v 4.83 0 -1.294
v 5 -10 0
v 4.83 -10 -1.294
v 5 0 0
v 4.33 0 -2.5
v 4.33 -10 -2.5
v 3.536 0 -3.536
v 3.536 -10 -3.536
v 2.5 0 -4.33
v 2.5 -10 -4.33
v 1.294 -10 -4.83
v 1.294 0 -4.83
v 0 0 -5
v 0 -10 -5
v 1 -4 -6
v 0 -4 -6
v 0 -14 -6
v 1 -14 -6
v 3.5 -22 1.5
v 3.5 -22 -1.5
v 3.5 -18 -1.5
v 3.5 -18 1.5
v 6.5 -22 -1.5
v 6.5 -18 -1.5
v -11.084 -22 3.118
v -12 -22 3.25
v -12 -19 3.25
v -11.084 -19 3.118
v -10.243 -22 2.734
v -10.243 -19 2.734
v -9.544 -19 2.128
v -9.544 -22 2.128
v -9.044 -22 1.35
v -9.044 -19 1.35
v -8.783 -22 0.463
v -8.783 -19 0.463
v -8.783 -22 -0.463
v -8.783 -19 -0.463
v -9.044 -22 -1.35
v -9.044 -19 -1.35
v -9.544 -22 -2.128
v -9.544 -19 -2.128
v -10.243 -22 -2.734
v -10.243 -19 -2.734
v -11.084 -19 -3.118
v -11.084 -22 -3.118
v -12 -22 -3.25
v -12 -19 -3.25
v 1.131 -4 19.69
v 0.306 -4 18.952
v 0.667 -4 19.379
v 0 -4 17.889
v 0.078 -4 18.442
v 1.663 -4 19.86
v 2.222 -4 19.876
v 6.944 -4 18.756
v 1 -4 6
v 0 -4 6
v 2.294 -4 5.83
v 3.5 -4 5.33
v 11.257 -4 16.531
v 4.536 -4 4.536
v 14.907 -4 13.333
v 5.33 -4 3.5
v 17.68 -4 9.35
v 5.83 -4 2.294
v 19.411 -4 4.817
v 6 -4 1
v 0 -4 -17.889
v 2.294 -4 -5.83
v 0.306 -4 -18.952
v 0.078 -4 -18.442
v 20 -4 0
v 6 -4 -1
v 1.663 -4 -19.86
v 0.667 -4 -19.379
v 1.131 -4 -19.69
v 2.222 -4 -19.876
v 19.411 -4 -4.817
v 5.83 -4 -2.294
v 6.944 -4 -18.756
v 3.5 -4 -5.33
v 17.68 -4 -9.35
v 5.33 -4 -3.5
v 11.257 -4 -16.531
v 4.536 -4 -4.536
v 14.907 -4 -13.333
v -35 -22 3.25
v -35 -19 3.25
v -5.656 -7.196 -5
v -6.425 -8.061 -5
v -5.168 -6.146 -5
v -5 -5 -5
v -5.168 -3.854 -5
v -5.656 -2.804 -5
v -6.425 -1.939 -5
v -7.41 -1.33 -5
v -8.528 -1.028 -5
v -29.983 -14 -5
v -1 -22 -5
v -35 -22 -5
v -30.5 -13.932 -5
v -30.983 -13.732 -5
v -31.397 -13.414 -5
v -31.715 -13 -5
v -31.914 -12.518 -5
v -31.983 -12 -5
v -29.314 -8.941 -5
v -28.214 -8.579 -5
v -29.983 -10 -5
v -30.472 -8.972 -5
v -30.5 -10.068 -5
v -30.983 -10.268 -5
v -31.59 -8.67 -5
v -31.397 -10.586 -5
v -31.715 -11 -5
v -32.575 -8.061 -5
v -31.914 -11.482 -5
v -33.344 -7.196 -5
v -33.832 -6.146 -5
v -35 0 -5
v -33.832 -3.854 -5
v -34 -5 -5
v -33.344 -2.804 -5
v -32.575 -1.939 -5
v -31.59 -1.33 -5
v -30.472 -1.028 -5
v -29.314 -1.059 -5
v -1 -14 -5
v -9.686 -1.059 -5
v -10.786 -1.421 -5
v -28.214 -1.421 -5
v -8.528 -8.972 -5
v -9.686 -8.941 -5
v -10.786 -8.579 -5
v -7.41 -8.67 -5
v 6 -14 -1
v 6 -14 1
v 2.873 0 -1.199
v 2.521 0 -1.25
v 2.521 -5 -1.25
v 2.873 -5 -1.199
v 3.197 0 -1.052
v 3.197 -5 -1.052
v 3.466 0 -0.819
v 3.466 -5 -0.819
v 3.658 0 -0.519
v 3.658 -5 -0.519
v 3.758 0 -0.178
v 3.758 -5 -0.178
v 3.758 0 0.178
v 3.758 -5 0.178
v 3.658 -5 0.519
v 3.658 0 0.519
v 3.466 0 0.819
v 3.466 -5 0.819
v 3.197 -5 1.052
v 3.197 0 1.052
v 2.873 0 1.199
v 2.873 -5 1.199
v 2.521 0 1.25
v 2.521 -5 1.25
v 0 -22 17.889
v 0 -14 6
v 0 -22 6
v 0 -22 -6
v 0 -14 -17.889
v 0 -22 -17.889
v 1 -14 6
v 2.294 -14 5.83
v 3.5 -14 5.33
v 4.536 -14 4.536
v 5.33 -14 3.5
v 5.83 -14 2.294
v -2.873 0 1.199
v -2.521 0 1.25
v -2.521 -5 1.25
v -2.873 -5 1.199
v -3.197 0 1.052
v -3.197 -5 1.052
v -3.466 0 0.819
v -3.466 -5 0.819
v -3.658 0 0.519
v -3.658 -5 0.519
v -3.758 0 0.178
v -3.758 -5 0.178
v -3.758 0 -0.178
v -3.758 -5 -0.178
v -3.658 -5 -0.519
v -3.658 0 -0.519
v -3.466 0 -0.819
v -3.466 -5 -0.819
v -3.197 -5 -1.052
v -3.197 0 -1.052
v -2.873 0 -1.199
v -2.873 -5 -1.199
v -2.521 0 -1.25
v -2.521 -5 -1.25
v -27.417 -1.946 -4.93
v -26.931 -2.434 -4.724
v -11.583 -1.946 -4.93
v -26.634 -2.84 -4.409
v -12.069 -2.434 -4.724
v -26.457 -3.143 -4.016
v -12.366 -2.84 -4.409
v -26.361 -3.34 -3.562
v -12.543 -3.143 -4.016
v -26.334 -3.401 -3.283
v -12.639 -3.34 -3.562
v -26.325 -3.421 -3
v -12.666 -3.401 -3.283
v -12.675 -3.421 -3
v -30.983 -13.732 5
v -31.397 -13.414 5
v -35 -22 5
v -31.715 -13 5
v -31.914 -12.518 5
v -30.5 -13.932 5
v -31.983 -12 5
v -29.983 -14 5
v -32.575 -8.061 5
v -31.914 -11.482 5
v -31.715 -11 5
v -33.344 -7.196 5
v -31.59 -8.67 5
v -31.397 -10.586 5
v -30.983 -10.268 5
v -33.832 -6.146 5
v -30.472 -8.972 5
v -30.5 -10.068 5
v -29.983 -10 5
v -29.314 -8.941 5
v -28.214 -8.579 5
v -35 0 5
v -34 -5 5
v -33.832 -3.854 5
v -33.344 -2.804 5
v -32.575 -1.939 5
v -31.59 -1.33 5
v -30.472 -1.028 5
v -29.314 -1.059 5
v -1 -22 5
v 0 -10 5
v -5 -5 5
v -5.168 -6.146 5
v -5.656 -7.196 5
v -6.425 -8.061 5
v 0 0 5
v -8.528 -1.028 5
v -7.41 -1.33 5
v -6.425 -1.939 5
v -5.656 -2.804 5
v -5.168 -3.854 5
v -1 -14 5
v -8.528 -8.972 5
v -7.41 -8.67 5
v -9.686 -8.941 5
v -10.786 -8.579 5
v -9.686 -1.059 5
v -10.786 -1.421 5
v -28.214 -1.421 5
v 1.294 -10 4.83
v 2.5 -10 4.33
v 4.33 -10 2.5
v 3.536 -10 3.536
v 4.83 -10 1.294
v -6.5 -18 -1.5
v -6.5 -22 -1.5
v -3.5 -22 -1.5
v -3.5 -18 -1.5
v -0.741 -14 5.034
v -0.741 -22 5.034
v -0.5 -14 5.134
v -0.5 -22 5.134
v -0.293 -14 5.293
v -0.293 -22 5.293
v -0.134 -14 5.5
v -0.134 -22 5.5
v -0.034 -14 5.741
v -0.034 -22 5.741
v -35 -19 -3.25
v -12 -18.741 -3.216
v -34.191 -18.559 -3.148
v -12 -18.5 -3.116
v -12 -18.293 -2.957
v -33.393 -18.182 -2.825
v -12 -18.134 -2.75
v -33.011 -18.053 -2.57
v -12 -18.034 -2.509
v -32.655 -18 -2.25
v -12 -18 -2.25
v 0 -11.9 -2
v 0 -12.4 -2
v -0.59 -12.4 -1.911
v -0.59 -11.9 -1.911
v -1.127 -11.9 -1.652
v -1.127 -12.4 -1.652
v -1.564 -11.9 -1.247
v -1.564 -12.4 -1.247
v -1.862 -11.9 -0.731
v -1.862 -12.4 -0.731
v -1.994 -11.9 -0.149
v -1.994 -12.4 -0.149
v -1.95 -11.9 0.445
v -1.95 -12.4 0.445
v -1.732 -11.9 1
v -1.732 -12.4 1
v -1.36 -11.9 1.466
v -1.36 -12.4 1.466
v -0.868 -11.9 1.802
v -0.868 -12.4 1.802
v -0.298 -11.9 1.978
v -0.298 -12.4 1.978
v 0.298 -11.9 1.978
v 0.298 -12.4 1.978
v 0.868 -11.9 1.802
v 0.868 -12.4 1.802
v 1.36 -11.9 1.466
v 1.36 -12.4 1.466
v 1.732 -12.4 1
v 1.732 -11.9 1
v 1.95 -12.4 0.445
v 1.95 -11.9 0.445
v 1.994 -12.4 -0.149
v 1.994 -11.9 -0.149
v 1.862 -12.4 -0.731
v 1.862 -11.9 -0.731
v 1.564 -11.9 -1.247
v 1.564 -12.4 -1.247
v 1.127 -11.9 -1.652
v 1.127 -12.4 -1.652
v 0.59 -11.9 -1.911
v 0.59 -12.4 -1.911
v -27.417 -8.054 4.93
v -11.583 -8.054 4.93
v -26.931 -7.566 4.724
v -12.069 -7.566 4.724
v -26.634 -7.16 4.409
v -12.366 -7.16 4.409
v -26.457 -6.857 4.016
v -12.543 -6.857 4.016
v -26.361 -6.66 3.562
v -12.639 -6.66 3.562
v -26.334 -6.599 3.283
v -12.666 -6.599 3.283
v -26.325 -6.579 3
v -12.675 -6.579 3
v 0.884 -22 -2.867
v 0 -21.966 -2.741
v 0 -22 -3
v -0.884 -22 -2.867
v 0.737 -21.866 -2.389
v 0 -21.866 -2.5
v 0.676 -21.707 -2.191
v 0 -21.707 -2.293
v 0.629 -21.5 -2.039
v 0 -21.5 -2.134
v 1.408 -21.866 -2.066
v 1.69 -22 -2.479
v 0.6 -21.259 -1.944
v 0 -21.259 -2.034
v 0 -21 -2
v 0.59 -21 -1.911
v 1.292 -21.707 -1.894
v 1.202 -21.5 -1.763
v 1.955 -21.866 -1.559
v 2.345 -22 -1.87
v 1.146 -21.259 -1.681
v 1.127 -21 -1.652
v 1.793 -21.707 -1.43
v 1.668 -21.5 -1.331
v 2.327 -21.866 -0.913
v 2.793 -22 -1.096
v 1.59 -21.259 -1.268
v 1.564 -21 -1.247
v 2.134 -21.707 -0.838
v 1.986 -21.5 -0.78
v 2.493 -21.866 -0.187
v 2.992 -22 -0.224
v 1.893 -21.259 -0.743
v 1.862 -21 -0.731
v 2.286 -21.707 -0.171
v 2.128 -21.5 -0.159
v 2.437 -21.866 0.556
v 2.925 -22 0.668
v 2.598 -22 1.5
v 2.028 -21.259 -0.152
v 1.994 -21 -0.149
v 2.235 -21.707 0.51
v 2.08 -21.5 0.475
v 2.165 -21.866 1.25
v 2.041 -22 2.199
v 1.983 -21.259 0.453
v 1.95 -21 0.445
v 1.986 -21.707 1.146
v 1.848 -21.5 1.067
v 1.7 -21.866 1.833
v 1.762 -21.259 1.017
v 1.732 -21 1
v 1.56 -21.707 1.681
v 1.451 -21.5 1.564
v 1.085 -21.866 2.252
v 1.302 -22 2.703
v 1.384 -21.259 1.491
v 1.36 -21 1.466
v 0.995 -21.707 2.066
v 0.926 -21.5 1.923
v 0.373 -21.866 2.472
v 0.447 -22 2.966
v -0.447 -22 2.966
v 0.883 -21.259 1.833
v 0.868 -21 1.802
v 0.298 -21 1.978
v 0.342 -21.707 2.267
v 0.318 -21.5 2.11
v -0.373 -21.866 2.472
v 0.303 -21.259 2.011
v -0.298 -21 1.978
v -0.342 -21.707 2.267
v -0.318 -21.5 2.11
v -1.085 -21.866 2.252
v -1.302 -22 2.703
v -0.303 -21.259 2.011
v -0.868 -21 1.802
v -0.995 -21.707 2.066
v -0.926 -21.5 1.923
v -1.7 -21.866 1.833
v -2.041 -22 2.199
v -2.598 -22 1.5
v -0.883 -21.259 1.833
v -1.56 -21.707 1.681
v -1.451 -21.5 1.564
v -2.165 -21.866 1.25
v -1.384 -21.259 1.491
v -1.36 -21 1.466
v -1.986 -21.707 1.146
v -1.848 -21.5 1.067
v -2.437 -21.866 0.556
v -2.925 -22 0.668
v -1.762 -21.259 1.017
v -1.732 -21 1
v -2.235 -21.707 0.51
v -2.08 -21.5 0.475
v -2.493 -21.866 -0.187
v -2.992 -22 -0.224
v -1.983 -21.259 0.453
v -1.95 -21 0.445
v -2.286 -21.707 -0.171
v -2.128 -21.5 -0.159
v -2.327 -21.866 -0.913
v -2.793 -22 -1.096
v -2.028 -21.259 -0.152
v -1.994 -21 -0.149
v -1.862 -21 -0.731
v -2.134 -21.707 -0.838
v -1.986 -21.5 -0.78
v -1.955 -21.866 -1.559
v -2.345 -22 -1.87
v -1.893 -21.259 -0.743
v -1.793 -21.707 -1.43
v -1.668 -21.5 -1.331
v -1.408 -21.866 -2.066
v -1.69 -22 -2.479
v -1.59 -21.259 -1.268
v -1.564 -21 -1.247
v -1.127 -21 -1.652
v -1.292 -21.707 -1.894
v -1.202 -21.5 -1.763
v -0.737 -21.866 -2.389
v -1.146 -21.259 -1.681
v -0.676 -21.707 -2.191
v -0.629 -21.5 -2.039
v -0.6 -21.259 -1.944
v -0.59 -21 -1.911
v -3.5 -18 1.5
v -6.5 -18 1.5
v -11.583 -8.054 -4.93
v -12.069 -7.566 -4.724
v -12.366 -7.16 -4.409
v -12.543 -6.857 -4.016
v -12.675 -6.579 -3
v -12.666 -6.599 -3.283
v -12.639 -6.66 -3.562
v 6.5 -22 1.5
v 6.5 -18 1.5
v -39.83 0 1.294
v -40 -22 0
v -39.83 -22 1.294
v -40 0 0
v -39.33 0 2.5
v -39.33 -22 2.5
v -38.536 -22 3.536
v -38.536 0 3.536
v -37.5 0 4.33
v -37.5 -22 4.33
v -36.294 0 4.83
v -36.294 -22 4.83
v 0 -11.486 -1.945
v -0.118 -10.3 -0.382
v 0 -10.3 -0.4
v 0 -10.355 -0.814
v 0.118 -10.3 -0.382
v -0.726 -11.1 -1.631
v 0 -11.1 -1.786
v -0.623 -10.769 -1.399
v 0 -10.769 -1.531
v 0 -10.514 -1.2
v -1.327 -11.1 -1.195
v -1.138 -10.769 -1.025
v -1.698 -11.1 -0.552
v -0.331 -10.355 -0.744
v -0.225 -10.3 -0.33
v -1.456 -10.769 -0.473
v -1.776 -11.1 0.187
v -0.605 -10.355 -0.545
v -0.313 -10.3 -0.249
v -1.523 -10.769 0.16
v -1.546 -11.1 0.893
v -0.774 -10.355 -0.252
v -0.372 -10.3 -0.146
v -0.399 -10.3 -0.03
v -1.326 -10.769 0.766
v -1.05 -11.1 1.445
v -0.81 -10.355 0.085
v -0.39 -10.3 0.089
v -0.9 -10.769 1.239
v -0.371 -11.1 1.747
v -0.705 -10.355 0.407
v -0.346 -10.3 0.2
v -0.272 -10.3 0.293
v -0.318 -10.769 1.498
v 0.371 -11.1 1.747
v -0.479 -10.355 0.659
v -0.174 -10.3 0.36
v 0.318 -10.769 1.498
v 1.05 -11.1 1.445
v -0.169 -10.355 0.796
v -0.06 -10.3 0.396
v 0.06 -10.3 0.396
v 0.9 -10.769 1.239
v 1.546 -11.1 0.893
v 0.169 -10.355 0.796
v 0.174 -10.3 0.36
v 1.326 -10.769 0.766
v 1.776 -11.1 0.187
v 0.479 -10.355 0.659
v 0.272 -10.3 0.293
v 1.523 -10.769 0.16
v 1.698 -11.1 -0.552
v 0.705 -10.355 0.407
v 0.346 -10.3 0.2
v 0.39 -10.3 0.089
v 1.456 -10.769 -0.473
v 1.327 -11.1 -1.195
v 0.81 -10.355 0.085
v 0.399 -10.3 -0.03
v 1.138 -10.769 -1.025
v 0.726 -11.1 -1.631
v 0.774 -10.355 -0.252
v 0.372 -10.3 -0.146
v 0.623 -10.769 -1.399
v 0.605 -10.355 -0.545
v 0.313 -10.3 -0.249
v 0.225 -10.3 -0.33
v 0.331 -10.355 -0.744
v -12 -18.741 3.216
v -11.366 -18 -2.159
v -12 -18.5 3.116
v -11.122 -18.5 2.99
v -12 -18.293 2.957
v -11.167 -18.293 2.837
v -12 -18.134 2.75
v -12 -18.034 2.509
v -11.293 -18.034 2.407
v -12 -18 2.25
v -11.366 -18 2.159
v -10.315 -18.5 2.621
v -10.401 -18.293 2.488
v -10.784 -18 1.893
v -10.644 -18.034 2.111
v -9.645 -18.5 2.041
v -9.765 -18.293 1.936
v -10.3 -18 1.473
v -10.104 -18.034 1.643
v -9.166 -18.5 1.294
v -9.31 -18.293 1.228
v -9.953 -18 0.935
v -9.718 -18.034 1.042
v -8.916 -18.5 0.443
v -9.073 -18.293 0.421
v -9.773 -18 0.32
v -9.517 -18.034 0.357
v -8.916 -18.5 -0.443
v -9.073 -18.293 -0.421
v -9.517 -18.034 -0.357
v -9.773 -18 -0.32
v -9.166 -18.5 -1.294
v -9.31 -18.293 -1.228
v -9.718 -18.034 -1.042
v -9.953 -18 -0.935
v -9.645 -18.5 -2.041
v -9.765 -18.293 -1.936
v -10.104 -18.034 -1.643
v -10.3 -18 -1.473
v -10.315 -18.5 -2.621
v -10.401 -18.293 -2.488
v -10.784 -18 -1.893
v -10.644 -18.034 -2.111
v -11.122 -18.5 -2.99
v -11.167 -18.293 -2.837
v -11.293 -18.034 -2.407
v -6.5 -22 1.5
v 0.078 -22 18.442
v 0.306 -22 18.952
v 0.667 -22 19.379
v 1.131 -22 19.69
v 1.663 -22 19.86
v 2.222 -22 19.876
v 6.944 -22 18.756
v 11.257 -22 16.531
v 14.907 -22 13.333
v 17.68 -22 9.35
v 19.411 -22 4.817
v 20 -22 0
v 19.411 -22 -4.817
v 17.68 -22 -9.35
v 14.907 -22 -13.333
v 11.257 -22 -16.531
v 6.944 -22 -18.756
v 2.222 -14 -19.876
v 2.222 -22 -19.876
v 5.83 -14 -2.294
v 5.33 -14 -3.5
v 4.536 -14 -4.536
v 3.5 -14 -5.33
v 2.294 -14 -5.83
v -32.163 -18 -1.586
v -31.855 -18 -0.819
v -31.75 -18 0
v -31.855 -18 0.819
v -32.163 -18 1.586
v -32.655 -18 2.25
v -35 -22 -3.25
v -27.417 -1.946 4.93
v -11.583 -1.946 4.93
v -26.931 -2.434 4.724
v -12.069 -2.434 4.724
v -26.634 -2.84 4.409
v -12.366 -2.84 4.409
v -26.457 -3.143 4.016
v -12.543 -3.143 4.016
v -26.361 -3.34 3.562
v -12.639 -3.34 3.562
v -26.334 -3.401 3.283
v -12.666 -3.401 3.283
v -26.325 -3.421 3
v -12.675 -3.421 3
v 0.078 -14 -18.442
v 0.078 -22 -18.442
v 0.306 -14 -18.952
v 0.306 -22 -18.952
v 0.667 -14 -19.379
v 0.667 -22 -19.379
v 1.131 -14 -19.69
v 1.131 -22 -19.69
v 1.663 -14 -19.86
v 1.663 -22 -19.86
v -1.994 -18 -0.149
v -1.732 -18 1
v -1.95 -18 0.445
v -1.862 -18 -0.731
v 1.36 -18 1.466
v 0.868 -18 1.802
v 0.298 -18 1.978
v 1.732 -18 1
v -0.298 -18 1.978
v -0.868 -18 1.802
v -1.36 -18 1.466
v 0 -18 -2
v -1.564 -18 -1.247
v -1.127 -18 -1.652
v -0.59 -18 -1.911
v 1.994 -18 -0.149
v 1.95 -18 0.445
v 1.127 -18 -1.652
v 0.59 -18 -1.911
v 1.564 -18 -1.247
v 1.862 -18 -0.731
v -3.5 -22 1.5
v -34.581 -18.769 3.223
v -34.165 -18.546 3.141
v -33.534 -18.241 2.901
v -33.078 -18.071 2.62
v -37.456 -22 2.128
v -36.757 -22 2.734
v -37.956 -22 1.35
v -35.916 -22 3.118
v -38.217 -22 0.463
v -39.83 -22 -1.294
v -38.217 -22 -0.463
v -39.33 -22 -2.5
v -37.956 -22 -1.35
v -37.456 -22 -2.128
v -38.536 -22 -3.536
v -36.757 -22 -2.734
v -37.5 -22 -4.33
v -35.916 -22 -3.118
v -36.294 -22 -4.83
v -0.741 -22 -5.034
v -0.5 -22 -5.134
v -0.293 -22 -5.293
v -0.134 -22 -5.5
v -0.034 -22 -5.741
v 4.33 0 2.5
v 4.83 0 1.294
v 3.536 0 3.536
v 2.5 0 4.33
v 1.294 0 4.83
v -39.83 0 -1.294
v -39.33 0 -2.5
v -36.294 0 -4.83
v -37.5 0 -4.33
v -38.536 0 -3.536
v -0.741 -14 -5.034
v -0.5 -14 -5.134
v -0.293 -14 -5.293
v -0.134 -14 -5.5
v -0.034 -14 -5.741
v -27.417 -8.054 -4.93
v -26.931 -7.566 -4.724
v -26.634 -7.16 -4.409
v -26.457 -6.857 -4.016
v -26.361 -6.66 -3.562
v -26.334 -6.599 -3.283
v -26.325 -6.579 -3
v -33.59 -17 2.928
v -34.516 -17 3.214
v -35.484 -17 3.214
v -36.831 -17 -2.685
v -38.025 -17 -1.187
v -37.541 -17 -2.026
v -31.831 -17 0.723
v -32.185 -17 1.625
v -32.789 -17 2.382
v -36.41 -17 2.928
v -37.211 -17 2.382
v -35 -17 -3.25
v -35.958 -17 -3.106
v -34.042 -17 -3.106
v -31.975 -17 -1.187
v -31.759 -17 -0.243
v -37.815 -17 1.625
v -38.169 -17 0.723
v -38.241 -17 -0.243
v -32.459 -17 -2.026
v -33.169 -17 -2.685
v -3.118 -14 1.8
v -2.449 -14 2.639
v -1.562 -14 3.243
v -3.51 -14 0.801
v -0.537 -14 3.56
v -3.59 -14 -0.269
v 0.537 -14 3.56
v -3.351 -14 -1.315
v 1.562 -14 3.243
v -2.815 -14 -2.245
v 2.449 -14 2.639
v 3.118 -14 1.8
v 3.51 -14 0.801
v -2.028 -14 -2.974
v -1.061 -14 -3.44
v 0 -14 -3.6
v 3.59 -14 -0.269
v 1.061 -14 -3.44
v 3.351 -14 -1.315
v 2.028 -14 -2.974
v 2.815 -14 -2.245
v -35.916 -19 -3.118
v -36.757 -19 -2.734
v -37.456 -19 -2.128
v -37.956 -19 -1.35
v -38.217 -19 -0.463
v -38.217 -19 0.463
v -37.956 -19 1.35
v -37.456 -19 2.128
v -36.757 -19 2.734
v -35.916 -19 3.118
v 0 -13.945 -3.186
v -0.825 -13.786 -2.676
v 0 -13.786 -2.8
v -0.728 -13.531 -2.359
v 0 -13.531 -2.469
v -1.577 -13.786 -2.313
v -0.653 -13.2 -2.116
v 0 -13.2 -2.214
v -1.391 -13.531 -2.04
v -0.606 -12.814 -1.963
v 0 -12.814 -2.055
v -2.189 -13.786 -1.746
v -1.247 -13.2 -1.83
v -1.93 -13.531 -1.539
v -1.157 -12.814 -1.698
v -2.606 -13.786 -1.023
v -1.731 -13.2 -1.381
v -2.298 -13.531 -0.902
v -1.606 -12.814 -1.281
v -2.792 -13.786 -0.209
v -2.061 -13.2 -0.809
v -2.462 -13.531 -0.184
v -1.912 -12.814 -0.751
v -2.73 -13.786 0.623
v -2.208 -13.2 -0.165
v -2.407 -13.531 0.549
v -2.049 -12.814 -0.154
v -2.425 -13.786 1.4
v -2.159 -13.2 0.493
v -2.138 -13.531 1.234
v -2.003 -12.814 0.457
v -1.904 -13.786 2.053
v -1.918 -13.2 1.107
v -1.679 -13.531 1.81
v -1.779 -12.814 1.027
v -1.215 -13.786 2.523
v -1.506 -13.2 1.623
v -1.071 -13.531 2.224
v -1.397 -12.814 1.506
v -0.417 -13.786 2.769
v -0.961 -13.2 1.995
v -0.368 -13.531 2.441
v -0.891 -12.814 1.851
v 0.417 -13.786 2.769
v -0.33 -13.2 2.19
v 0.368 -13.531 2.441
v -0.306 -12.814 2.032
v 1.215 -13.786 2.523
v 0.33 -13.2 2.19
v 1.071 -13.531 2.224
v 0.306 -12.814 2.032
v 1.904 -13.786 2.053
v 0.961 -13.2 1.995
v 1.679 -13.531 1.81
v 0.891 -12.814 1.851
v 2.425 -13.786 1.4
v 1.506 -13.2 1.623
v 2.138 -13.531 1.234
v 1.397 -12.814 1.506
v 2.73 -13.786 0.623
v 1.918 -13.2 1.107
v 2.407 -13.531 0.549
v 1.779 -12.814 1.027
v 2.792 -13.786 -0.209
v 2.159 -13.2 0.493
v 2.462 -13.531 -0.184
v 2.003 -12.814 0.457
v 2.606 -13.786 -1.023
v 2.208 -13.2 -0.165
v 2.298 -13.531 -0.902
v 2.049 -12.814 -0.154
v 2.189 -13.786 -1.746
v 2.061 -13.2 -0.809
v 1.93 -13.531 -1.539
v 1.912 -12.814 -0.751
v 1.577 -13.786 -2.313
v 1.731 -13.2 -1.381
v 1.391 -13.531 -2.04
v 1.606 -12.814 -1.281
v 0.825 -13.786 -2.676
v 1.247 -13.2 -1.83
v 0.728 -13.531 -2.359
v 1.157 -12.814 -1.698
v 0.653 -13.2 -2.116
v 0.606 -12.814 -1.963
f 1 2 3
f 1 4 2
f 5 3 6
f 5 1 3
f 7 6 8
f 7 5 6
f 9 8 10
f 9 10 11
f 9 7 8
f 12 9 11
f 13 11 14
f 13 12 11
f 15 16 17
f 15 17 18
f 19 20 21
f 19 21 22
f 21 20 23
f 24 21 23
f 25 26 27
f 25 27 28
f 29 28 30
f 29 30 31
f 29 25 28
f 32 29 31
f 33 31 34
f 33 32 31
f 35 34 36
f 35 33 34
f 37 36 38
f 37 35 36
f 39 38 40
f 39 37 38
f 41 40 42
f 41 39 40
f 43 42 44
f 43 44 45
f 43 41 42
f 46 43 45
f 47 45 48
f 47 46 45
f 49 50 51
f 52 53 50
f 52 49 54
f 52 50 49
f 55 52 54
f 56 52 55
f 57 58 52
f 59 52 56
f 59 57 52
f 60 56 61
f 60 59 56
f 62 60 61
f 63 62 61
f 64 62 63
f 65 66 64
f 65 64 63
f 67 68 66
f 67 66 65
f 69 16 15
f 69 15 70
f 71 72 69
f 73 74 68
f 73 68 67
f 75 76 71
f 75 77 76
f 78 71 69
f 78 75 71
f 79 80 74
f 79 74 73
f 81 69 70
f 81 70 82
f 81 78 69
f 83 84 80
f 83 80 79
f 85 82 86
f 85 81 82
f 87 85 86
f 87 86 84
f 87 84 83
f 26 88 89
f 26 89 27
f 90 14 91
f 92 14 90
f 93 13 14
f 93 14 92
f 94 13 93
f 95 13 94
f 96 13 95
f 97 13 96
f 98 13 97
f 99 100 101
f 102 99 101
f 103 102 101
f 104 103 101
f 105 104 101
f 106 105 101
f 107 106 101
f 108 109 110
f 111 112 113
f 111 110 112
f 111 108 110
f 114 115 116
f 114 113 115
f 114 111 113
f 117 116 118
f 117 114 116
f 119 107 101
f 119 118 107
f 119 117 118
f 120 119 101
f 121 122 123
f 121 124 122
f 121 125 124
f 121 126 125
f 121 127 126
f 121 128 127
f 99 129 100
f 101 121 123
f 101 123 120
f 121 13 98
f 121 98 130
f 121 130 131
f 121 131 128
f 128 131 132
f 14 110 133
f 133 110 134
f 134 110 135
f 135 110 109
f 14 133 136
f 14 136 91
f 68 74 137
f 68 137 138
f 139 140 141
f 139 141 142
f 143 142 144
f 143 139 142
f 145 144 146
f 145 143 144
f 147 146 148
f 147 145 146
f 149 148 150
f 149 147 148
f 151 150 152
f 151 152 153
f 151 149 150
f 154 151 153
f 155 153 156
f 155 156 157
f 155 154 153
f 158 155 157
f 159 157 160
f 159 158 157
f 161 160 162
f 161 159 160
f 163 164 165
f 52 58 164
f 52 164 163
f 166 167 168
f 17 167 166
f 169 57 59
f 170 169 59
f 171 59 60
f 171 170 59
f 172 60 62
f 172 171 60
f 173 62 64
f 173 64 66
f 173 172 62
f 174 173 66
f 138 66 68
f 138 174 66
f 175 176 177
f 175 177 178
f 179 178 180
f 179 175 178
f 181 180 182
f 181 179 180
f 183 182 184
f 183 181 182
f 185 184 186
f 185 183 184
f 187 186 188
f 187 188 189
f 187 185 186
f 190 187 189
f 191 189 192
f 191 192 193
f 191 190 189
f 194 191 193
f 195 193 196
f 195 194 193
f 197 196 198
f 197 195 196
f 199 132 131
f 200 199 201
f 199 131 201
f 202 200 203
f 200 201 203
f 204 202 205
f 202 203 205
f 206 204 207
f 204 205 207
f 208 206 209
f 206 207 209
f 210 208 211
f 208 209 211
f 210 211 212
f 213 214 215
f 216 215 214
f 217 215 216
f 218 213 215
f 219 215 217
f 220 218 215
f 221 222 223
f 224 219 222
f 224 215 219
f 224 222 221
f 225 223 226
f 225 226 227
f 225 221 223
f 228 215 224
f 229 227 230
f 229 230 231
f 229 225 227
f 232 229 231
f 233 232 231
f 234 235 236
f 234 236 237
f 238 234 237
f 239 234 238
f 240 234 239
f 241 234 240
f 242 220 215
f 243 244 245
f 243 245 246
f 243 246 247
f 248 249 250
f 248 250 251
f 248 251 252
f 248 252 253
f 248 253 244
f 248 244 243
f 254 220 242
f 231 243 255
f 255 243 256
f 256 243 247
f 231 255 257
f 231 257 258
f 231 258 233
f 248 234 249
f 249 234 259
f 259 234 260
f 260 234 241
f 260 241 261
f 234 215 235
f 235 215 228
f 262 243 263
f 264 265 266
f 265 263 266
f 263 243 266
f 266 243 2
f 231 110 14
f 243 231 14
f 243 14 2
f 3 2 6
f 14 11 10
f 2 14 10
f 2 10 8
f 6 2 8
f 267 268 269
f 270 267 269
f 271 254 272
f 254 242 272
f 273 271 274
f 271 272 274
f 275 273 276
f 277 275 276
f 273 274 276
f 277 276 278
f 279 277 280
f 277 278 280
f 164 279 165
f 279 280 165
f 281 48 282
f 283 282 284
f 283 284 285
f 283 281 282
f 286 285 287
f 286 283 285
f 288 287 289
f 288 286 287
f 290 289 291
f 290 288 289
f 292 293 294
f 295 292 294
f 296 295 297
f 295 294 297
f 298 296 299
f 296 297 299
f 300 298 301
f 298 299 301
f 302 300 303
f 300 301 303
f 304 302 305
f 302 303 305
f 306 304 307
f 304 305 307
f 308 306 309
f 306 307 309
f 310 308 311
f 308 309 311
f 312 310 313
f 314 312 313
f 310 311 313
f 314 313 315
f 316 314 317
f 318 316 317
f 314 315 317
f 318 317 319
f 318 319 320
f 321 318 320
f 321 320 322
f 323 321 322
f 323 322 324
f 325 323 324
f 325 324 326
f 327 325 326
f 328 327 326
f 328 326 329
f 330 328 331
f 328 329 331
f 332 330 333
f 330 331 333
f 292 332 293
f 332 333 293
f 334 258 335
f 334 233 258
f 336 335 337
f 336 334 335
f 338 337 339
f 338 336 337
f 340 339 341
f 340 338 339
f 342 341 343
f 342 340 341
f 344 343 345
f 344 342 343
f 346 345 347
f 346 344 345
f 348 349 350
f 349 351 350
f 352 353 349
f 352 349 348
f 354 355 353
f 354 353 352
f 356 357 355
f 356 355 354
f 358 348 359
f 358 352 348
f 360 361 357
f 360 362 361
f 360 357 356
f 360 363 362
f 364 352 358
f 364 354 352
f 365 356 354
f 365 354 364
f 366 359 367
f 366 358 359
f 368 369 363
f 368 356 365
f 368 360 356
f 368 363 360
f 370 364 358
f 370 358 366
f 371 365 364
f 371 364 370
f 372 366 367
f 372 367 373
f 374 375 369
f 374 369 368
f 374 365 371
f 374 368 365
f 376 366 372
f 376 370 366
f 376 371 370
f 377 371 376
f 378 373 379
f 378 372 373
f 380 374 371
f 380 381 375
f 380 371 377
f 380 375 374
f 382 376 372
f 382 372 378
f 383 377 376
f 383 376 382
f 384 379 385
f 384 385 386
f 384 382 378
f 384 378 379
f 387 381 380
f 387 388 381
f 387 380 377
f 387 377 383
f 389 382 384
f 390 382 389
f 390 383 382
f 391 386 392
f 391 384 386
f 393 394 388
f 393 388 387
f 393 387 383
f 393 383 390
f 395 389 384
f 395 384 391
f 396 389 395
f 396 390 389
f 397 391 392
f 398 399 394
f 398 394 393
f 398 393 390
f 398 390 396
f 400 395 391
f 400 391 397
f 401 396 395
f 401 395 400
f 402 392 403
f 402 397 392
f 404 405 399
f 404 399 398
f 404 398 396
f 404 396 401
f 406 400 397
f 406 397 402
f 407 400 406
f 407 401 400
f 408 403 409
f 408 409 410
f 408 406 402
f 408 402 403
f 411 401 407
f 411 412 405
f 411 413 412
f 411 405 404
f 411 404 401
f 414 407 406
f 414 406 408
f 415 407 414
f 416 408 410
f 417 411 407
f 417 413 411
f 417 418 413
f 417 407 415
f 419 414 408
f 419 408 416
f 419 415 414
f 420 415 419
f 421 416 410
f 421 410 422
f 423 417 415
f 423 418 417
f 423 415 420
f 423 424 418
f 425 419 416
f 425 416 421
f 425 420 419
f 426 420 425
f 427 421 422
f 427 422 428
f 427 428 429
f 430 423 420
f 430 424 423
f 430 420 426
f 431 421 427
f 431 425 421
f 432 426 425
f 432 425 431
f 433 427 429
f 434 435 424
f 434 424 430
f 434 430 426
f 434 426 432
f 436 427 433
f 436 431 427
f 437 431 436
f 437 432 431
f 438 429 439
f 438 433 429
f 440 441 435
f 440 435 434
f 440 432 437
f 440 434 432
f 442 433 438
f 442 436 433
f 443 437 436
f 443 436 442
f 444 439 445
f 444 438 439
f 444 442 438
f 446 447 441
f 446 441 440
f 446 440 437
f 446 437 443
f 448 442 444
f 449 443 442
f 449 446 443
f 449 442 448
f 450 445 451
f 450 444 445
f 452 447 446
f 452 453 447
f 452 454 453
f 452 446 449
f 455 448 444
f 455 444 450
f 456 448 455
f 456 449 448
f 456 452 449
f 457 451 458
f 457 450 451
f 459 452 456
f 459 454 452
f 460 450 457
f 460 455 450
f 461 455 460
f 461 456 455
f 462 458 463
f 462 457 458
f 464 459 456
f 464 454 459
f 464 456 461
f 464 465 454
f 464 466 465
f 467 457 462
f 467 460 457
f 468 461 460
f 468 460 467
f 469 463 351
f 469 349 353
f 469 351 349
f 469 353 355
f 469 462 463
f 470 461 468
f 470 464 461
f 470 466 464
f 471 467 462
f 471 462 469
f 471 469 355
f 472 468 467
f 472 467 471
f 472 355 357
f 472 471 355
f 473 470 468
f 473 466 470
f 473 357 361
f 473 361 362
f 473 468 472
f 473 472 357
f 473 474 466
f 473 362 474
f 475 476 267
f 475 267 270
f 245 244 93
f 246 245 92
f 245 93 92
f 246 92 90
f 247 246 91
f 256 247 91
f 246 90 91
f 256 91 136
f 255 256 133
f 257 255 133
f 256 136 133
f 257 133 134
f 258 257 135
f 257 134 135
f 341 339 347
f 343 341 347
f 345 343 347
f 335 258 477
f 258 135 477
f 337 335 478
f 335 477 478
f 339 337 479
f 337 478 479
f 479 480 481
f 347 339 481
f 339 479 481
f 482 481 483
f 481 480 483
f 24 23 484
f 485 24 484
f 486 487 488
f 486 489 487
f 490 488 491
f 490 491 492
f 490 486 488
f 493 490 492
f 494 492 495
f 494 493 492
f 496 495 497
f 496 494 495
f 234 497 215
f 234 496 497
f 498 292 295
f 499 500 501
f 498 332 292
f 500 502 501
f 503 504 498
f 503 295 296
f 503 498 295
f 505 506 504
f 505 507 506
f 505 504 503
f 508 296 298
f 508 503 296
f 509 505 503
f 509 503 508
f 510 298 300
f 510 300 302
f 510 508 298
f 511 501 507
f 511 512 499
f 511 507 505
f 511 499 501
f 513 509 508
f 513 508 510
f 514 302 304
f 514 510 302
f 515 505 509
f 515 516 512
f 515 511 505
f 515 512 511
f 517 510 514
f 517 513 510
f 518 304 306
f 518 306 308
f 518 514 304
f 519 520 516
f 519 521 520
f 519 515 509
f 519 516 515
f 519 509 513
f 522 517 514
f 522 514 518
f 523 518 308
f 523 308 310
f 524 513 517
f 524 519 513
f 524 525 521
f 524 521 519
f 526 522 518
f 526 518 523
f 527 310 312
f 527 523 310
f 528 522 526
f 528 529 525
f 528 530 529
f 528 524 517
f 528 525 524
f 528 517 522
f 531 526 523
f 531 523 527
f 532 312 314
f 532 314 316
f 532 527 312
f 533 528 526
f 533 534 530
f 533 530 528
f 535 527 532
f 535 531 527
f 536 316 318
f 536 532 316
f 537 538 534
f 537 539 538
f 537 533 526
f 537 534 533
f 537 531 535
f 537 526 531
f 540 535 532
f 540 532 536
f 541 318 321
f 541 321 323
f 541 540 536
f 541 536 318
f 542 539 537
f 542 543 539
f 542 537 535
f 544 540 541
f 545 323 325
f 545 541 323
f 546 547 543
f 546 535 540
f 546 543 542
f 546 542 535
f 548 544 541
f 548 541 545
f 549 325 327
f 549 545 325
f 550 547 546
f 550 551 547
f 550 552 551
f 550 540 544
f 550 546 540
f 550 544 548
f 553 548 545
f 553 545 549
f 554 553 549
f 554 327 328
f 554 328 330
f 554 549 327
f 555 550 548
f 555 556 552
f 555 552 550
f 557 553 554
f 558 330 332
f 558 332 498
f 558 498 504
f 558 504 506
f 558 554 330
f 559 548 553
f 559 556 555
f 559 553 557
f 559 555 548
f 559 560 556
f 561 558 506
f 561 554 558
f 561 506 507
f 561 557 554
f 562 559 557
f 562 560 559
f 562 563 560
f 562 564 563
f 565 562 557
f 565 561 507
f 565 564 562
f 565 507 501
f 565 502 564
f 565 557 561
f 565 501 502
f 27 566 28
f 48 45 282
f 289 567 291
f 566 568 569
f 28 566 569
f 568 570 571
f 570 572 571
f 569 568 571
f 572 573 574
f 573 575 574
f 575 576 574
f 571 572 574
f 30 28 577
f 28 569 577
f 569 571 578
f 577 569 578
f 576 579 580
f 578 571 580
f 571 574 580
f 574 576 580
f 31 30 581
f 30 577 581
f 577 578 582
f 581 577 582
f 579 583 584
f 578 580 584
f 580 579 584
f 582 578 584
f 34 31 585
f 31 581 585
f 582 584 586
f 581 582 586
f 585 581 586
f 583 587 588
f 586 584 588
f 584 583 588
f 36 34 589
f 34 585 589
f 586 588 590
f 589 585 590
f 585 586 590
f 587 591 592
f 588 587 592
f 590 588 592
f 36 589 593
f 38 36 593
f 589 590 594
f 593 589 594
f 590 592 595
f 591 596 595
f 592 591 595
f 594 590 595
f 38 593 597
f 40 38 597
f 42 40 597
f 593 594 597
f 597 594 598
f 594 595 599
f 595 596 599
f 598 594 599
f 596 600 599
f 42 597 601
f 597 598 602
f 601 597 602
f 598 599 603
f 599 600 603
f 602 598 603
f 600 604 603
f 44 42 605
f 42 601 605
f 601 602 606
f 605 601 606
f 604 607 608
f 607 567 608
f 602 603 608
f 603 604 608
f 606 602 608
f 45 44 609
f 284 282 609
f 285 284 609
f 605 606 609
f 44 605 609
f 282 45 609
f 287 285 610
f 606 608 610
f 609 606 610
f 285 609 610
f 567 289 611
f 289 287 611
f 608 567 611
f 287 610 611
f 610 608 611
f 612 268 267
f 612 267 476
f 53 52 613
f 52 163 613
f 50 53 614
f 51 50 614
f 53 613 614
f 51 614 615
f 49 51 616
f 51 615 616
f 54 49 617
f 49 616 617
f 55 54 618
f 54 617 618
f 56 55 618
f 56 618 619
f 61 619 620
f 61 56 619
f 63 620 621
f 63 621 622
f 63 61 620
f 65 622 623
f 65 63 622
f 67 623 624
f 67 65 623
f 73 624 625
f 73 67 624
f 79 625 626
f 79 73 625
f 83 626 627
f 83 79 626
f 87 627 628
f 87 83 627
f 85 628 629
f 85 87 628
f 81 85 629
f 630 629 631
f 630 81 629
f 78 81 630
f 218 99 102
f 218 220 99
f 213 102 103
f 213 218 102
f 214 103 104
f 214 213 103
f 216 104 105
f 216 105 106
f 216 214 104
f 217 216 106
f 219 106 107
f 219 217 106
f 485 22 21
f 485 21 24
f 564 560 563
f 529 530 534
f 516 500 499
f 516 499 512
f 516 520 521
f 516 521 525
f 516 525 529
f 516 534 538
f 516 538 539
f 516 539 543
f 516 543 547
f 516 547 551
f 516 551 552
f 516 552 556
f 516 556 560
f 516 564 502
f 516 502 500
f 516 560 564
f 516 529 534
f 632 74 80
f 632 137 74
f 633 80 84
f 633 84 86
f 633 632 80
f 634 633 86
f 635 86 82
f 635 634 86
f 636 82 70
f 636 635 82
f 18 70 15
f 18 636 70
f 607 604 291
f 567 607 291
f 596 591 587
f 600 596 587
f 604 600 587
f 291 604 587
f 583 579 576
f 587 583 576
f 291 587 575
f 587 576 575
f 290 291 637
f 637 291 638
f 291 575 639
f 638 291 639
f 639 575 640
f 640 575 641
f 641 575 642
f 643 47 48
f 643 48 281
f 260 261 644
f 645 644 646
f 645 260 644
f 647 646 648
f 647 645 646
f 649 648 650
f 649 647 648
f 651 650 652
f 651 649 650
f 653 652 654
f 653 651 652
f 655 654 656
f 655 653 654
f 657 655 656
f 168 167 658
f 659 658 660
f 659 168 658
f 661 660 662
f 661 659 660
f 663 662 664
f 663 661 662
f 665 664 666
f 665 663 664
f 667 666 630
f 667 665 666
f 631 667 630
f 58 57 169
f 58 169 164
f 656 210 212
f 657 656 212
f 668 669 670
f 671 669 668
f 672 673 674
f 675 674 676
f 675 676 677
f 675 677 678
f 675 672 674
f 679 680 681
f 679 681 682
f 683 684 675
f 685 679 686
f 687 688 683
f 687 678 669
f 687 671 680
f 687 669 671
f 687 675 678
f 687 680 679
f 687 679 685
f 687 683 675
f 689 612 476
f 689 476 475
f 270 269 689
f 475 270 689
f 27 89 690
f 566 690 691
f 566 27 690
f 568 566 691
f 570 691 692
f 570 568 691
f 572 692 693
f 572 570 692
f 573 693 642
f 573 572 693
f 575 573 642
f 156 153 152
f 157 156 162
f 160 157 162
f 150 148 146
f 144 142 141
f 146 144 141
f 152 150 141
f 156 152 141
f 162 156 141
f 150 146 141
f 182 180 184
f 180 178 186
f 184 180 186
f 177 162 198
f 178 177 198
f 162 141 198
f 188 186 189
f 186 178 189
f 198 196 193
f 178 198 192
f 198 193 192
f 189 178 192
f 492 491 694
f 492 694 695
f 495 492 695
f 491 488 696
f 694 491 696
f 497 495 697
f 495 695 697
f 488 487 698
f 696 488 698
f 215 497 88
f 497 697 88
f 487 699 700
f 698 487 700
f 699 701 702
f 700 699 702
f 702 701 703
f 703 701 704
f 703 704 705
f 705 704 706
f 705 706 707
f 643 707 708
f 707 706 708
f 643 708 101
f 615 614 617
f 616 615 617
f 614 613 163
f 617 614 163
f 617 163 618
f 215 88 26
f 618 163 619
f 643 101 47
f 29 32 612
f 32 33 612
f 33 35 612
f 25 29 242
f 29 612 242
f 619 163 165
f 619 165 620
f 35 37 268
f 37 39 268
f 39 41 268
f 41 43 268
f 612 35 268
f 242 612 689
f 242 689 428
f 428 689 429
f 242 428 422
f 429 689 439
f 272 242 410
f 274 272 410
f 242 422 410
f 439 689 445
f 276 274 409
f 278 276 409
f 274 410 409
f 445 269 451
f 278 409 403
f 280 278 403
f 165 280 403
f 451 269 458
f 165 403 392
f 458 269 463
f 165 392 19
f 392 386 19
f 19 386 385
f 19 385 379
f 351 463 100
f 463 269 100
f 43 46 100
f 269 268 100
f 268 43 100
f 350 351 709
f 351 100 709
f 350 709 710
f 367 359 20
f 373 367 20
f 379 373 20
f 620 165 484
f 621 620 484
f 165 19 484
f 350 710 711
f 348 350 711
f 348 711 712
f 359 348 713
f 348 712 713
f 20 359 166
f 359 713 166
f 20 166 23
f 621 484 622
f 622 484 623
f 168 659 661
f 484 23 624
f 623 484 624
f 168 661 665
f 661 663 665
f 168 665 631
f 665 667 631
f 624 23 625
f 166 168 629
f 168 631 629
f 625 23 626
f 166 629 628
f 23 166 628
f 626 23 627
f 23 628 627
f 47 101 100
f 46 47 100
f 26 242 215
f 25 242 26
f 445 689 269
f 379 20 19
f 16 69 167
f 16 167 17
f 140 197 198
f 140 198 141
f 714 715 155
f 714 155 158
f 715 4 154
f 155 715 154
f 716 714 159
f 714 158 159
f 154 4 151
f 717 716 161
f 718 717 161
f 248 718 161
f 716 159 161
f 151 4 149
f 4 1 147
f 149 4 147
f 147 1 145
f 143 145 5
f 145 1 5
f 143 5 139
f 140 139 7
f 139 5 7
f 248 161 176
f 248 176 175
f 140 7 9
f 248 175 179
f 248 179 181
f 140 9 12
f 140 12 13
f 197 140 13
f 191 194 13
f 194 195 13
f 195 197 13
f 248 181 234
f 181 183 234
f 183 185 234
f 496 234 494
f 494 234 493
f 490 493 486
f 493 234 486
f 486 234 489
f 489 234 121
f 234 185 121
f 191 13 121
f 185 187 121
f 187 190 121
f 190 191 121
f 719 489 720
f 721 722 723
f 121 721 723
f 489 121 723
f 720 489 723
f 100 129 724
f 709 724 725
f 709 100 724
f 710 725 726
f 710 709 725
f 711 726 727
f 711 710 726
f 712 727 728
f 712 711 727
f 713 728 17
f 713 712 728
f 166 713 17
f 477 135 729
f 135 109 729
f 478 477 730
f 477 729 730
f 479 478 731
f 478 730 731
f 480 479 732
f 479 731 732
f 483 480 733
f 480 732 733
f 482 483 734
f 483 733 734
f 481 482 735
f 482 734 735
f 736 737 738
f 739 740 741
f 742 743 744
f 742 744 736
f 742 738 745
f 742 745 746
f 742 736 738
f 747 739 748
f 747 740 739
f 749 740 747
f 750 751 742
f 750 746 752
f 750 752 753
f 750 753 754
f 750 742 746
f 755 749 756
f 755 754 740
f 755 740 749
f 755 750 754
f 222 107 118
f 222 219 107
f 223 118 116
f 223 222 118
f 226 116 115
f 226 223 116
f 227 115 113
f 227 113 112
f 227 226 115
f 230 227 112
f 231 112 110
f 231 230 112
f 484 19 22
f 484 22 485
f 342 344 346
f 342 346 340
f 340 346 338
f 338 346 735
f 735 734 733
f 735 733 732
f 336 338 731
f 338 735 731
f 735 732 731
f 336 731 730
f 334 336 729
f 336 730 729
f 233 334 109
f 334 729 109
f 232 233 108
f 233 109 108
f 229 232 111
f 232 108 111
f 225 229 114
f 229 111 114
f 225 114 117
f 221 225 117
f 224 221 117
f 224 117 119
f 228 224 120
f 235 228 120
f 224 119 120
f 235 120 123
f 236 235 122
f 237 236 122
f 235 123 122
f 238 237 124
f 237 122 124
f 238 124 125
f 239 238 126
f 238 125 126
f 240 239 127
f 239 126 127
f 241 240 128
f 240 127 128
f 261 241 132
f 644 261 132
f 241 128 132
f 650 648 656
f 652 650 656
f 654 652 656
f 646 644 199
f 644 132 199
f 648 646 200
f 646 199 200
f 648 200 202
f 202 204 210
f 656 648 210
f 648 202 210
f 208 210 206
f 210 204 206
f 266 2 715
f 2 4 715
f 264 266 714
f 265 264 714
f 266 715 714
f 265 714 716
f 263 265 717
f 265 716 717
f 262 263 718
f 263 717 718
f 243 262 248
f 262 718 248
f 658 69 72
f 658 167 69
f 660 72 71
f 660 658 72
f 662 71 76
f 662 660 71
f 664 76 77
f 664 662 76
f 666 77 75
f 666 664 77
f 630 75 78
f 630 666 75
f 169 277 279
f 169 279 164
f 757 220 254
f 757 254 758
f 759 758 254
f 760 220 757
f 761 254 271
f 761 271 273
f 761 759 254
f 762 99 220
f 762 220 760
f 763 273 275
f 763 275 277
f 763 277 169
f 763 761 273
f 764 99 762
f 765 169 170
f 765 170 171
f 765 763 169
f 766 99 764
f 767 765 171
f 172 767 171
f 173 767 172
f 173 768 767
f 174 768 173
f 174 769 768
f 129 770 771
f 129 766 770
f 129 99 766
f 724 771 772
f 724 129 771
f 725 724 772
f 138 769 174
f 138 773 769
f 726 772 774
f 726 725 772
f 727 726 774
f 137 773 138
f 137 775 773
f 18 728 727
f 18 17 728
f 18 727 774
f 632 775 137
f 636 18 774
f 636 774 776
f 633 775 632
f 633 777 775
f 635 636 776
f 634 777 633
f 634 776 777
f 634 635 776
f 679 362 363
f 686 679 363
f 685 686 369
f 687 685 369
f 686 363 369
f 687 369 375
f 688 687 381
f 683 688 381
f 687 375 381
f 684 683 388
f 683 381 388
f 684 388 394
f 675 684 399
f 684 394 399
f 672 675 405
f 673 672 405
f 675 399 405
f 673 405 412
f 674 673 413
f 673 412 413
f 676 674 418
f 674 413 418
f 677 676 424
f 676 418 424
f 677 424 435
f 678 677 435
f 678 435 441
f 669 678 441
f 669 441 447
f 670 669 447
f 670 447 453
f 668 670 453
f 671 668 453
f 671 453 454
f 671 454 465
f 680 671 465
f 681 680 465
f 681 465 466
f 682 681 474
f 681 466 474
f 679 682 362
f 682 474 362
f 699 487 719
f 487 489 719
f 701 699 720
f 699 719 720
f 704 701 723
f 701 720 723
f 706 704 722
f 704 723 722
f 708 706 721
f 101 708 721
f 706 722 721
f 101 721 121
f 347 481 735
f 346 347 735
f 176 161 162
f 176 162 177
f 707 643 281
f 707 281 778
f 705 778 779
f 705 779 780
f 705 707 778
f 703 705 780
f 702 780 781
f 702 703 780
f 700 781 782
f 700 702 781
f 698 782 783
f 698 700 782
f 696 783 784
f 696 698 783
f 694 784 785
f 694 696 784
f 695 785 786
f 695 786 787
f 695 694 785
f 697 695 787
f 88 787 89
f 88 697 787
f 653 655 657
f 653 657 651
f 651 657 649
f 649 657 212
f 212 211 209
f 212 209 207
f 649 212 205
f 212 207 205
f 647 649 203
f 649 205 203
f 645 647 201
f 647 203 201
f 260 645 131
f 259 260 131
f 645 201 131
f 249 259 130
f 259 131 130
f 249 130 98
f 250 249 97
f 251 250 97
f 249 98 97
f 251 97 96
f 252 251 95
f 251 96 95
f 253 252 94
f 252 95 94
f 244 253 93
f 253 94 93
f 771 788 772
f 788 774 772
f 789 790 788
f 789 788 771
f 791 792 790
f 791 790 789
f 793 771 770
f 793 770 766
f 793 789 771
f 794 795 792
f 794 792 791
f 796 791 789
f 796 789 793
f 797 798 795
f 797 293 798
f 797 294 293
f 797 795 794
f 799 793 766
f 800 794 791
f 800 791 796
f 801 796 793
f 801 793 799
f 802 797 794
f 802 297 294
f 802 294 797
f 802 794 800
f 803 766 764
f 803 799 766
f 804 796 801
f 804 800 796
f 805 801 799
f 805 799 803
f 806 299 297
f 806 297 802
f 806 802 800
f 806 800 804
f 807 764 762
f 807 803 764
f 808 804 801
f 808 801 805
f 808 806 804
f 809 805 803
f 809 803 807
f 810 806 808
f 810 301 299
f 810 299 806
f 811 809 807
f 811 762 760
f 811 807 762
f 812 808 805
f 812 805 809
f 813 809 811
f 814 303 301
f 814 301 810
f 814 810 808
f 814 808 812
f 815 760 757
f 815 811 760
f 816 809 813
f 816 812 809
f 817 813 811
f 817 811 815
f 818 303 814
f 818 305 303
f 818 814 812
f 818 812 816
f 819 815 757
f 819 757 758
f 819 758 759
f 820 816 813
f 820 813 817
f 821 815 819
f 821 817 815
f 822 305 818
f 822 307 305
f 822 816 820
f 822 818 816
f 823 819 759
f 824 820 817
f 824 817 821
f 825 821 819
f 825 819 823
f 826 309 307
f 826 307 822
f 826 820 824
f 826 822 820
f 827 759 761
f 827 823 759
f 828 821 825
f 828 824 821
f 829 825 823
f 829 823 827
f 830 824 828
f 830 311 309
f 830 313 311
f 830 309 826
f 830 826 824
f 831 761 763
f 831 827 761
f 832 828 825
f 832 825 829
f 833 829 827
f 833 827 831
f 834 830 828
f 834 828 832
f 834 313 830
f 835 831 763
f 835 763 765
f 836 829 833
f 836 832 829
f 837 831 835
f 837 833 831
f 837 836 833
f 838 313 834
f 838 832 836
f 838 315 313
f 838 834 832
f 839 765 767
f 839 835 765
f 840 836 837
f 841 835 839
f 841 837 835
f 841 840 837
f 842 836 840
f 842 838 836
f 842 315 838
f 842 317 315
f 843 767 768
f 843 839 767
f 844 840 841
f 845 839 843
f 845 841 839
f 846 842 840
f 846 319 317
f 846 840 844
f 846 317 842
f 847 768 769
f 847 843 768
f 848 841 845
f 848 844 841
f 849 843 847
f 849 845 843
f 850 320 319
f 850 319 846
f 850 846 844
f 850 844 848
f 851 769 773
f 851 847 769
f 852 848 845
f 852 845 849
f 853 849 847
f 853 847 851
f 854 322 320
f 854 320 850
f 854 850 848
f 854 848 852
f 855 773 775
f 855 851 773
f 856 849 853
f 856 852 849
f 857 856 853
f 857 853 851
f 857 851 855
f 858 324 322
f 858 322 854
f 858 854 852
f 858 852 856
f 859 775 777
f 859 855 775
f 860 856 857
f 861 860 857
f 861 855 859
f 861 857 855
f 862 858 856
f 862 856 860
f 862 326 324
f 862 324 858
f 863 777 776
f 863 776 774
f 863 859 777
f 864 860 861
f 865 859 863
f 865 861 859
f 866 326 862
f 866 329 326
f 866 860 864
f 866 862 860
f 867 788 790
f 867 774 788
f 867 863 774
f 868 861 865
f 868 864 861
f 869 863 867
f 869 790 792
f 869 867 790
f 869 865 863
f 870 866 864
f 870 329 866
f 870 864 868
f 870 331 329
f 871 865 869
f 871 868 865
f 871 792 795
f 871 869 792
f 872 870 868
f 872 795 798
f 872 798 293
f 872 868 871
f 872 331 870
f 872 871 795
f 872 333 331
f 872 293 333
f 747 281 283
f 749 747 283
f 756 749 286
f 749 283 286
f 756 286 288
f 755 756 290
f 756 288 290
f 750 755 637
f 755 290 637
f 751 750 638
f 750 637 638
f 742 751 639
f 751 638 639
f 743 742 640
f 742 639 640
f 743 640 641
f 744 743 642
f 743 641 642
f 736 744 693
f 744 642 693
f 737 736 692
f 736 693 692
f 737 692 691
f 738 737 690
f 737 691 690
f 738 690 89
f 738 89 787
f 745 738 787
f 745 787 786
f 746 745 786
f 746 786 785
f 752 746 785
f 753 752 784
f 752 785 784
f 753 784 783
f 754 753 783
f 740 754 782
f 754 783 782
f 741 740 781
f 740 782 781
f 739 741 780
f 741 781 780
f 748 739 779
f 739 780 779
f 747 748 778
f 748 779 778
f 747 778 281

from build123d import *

# Parameters (mm, degrees)
BOSS_EXTRUDE1_DEPTH      = 5
BOSS_EXTRUDE1_DEPTH_BACK = 5
CUT_EXTRUDE1_DEPTH       = 5
BOSS_EXTRUDE2_START      = -14
SKETCH3_W                = 5.881583951
SKETCH3_H                = 10
BOSS_EXTRUDE2_DEPTH      = 8
BOSS_EXTRUDE3_START      = 10
BOSS_EXTRUDE3_DEPTH      = 10
FILLET2_R                = 5
FILLET3_R                = 2
SKETCH5_R                = 2
SKETCH5_W                = 3
SKETCH5_H                = 3
CUT_EXTRUDE2_DEPTH       = 4
FILLET4_R                = 1
SKETCH6_R                = 3.25
CUT_EXTRUDE3_DEPTH       = 5
BOSS_EXTRUDE4_START      = -14
SKETCH7_R                = 2
BOSS_EXTRUDE4_DEPTH      = 3.7
FILLET5_R                = 1.6


with BuildPart() as part:
    # Sketch1 → Boss-Extrude1 (new, two sides: drawn at the far end of the back side and taken through both)
    with BuildSketch(Plane.XY.offset(-BOSS_EXTRUDE1_DEPTH_BACK)):
        Polygon((5, -10), (5, 0), (0, 0), (-5, 0), (-35, 0), (-40, 0), (-40, -14), (-31.982625312, -14), (-31.982625312, -10), (-5, -10), align=None)
        with BuildLine():
            ThreePointArc((-26.324974154, -6.579298906), (-34, -5), (-26.324974154, -3.420701094))
            Line((-26.324974154, -3.420701094), (-12.675025846, -3.420701094))
            ThreePointArc((-12.675025846, -3.420701094), (-8.193806283, -1.082085798), (-5, -5))
            ThreePointArc((-5, -5), (-8.193806283, -8.917914202), (-12.675025846, -6.579298906))
            Line((-12.675025846, -6.579298906), (-26.324974154, -6.579298906))
        make_face(mode=Mode.SUBTRACT)
    extrude(amount=BOSS_EXTRUDE1_DEPTH + BOSS_EXTRUDE1_DEPTH_BACK)

    # Sketch2 → Cut-Extrude1 (cut)
    with BuildSketch(Plane(origin=(0, 0, 0), x_dir=(1, 0, 0), z_dir=(0, 1, 0))):
        with BuildLine():
            Line((-2.520975228, 1.25), (2.520975228, 1.25))
            ThreePointArc((2.520975228, 1.25), (3.770975228, 0), (2.520975228, -1.25))
            Line((2.520975228, -1.25), (-2.520975228, -1.25))
            ThreePointArc((-2.520975228, -1.25), (-3.770975228, 0), (-2.520975228, 1.25))
        make_face()
    extrude(amount=-CUT_EXTRUDE1_DEPTH, mode=Mode.SUBTRACT)

    # Sketch3 → Boss-Extrude2 (add)
    with BuildSketch(Plane(origin=(0, 0, 0), x_dir=(1, 0, 0), z_dir=(0, 1, 0)).offset(BOSS_EXTRUDE2_START)):
        with BuildLine():
            Line((0, 20), (0, 5))
            Line((0, 5), (5.881583951, 5))
            Line((5.881583951, 5), (5.881583951, -5))
            Line((5.881583951, -5), (0, -5))
            Line((0, -5), (0, -20))
            ThreePointArc((0, -20), (14.142135624, -14.142135624), (20, 0))
            ThreePointArc((20, 0), (14.142135624, 14.142135624), (0, 20))
        make_face()
        with Locations((2.940791976, 0)):
            Rectangle(SKETCH3_W, SKETCH3_H)
        with BuildLine():
            Line((0, 5), (-19.364916731, 5))
            ThreePointArc((-19.364916731, 5), (-20, 0), (-19.364916731, -5))
            Line((-19.364916731, -5), (0, -5))
            Line((0, -5), (0, 5))
        make_face()
        with BuildLine():
            Line((-19.364916731, 5), (-40, 5))
            Line((-40, 5), (-40, -5))
            Line((-40, -5), (-19.364916731, -5))
            ThreePointArc((-19.364916731, -5), (-20, 0), (-19.364916731, 5))
        make_face()
    extrude(amount=-BOSS_EXTRUDE2_DEPTH)

    # Sketch4 → Boss-Extrude3 (add)
    with BuildSketch(Plane(origin=(0, -14, 0), x_dir=(1, 0, 0), z_dir=(0, 1, 0)).offset(BOSS_EXTRUDE3_START)):
        with BuildLine():
            ThreePointArc((20, 0), (14.142135624, 14.142135624), (0, 20))
            Line((0, 20), (0, 6))
            Line((0, 6), (6, 6))
            Line((6, 6), (6, -6))
            Line((6, -6), (0, -6))
            Line((0, -6), (0, -20))
            ThreePointArc((0, -20), (14.142135624, -14.142135624), (20, 0))
        make_face()
    extrude(amount=-BOSS_EXTRUDE3_DEPTH)

    # Fillet2
    fillet2_edges = [part.edges().sort_by_distance(p)[0] for p in [
        (-40, -11, -5),
        (-40, -11, 5),
        (6, -9, 6),
        (6, -9, -6),
        (5, -5, 5),
        (5, -5, -5),
    ]]
    fillet(fillet2_edges, radius=FILLET2_R - 0.0001)  # a hair under: the kernel refuses the full size

    # Fillet3
    fillet3_edges = [part.edges().sort_by_distance(p)[0] for p in [
        (-19.5, -3.420701094, 5),
        (-19.5, -3.420701094, -5),
        (-19.5, -6.579298906, 5),
        (-19.5, -6.579298906, -5),
        (-31.982625312, -10, 0),
        (-31.982625312, -14, 0),
        (0, -13, -20),
        (0, -13, 20),
    ]]
    fillet(fillet3_edges, radius=FILLET3_R - 0.0001)  # a hair under: the kernel refuses the full size

    # Sketch5 → Cut-Extrude2 (cut)
    with BuildSketch(Plane.XZ.offset(22)):
        with Locations(Location((0, 0, 0), (0, 0, 270))):
            Circle(SKETCH5_R)
        with BuildLine():
            Line((-35, 3.25), (-12, 3.25))
            ThreePointArc((-12, 3.25), (-8.75, 0), (-12, -3.25))
            Line((-12, -3.25), (-35, -3.25))
            ThreePointArc((-35, -3.25), (-38.25, 0), (-35, 3.25))
        make_face()
        with Locations((-5, 0)):
            Rectangle(SKETCH5_W, SKETCH5_H)
        with Locations((5, 0)):
            Rectangle(SKETCH5_W, SKETCH5_H)
    extrude(amount=-CUT_EXTRUDE2_DEPTH, mode=Mode.SUBTRACT)

    # Fillet4
    fillet4_edges = [part.edges().sort_by_distance(p)[0] for p in [
        (-23.5, -18, 3.25),
        (-8.75, -18, 0),
        (-23.5, -18, -3.25),
        (-38.25, -18, 0),
        (0, -18, -5),
        (0, -18, 5),
        (0, -22, 2),
    ]]
    fillet(fillet4_edges, radius=FILLET4_R)

    # Sketch6 → Cut-Extrude3 (cut)
    with BuildSketch(Plane.XZ.offset(22)):
        with Locations(Location((-35, 0, 0), (0, 0, 270))):
            Circle(SKETCH6_R)
    extrude(amount=-CUT_EXTRUDE3_DEPTH, mode=Mode.SUBTRACT)

    # Sketch7 → Boss-Extrude4 (add)
    with BuildSketch(Plane(origin=(0, 0, 0), x_dir=(1, 0, 0), z_dir=(0, 1, 0)).offset(BOSS_EXTRUDE4_START)):
        with Locations(Location((0, 0, 0), (0, 0, 90))):
            Circle(SKETCH7_R)
    extrude(amount=BOSS_EXTRUDE4_DEPTH)

    # Fillet5
    fillet5_edges = [part.edges().sort_by_distance(p)[0] for p in [
        (0, -14, 2),
        (0, -10.3, 2),
    ]]
    fillet(fillet5_edges, radius=FILLET5_R)


solid = part.part
